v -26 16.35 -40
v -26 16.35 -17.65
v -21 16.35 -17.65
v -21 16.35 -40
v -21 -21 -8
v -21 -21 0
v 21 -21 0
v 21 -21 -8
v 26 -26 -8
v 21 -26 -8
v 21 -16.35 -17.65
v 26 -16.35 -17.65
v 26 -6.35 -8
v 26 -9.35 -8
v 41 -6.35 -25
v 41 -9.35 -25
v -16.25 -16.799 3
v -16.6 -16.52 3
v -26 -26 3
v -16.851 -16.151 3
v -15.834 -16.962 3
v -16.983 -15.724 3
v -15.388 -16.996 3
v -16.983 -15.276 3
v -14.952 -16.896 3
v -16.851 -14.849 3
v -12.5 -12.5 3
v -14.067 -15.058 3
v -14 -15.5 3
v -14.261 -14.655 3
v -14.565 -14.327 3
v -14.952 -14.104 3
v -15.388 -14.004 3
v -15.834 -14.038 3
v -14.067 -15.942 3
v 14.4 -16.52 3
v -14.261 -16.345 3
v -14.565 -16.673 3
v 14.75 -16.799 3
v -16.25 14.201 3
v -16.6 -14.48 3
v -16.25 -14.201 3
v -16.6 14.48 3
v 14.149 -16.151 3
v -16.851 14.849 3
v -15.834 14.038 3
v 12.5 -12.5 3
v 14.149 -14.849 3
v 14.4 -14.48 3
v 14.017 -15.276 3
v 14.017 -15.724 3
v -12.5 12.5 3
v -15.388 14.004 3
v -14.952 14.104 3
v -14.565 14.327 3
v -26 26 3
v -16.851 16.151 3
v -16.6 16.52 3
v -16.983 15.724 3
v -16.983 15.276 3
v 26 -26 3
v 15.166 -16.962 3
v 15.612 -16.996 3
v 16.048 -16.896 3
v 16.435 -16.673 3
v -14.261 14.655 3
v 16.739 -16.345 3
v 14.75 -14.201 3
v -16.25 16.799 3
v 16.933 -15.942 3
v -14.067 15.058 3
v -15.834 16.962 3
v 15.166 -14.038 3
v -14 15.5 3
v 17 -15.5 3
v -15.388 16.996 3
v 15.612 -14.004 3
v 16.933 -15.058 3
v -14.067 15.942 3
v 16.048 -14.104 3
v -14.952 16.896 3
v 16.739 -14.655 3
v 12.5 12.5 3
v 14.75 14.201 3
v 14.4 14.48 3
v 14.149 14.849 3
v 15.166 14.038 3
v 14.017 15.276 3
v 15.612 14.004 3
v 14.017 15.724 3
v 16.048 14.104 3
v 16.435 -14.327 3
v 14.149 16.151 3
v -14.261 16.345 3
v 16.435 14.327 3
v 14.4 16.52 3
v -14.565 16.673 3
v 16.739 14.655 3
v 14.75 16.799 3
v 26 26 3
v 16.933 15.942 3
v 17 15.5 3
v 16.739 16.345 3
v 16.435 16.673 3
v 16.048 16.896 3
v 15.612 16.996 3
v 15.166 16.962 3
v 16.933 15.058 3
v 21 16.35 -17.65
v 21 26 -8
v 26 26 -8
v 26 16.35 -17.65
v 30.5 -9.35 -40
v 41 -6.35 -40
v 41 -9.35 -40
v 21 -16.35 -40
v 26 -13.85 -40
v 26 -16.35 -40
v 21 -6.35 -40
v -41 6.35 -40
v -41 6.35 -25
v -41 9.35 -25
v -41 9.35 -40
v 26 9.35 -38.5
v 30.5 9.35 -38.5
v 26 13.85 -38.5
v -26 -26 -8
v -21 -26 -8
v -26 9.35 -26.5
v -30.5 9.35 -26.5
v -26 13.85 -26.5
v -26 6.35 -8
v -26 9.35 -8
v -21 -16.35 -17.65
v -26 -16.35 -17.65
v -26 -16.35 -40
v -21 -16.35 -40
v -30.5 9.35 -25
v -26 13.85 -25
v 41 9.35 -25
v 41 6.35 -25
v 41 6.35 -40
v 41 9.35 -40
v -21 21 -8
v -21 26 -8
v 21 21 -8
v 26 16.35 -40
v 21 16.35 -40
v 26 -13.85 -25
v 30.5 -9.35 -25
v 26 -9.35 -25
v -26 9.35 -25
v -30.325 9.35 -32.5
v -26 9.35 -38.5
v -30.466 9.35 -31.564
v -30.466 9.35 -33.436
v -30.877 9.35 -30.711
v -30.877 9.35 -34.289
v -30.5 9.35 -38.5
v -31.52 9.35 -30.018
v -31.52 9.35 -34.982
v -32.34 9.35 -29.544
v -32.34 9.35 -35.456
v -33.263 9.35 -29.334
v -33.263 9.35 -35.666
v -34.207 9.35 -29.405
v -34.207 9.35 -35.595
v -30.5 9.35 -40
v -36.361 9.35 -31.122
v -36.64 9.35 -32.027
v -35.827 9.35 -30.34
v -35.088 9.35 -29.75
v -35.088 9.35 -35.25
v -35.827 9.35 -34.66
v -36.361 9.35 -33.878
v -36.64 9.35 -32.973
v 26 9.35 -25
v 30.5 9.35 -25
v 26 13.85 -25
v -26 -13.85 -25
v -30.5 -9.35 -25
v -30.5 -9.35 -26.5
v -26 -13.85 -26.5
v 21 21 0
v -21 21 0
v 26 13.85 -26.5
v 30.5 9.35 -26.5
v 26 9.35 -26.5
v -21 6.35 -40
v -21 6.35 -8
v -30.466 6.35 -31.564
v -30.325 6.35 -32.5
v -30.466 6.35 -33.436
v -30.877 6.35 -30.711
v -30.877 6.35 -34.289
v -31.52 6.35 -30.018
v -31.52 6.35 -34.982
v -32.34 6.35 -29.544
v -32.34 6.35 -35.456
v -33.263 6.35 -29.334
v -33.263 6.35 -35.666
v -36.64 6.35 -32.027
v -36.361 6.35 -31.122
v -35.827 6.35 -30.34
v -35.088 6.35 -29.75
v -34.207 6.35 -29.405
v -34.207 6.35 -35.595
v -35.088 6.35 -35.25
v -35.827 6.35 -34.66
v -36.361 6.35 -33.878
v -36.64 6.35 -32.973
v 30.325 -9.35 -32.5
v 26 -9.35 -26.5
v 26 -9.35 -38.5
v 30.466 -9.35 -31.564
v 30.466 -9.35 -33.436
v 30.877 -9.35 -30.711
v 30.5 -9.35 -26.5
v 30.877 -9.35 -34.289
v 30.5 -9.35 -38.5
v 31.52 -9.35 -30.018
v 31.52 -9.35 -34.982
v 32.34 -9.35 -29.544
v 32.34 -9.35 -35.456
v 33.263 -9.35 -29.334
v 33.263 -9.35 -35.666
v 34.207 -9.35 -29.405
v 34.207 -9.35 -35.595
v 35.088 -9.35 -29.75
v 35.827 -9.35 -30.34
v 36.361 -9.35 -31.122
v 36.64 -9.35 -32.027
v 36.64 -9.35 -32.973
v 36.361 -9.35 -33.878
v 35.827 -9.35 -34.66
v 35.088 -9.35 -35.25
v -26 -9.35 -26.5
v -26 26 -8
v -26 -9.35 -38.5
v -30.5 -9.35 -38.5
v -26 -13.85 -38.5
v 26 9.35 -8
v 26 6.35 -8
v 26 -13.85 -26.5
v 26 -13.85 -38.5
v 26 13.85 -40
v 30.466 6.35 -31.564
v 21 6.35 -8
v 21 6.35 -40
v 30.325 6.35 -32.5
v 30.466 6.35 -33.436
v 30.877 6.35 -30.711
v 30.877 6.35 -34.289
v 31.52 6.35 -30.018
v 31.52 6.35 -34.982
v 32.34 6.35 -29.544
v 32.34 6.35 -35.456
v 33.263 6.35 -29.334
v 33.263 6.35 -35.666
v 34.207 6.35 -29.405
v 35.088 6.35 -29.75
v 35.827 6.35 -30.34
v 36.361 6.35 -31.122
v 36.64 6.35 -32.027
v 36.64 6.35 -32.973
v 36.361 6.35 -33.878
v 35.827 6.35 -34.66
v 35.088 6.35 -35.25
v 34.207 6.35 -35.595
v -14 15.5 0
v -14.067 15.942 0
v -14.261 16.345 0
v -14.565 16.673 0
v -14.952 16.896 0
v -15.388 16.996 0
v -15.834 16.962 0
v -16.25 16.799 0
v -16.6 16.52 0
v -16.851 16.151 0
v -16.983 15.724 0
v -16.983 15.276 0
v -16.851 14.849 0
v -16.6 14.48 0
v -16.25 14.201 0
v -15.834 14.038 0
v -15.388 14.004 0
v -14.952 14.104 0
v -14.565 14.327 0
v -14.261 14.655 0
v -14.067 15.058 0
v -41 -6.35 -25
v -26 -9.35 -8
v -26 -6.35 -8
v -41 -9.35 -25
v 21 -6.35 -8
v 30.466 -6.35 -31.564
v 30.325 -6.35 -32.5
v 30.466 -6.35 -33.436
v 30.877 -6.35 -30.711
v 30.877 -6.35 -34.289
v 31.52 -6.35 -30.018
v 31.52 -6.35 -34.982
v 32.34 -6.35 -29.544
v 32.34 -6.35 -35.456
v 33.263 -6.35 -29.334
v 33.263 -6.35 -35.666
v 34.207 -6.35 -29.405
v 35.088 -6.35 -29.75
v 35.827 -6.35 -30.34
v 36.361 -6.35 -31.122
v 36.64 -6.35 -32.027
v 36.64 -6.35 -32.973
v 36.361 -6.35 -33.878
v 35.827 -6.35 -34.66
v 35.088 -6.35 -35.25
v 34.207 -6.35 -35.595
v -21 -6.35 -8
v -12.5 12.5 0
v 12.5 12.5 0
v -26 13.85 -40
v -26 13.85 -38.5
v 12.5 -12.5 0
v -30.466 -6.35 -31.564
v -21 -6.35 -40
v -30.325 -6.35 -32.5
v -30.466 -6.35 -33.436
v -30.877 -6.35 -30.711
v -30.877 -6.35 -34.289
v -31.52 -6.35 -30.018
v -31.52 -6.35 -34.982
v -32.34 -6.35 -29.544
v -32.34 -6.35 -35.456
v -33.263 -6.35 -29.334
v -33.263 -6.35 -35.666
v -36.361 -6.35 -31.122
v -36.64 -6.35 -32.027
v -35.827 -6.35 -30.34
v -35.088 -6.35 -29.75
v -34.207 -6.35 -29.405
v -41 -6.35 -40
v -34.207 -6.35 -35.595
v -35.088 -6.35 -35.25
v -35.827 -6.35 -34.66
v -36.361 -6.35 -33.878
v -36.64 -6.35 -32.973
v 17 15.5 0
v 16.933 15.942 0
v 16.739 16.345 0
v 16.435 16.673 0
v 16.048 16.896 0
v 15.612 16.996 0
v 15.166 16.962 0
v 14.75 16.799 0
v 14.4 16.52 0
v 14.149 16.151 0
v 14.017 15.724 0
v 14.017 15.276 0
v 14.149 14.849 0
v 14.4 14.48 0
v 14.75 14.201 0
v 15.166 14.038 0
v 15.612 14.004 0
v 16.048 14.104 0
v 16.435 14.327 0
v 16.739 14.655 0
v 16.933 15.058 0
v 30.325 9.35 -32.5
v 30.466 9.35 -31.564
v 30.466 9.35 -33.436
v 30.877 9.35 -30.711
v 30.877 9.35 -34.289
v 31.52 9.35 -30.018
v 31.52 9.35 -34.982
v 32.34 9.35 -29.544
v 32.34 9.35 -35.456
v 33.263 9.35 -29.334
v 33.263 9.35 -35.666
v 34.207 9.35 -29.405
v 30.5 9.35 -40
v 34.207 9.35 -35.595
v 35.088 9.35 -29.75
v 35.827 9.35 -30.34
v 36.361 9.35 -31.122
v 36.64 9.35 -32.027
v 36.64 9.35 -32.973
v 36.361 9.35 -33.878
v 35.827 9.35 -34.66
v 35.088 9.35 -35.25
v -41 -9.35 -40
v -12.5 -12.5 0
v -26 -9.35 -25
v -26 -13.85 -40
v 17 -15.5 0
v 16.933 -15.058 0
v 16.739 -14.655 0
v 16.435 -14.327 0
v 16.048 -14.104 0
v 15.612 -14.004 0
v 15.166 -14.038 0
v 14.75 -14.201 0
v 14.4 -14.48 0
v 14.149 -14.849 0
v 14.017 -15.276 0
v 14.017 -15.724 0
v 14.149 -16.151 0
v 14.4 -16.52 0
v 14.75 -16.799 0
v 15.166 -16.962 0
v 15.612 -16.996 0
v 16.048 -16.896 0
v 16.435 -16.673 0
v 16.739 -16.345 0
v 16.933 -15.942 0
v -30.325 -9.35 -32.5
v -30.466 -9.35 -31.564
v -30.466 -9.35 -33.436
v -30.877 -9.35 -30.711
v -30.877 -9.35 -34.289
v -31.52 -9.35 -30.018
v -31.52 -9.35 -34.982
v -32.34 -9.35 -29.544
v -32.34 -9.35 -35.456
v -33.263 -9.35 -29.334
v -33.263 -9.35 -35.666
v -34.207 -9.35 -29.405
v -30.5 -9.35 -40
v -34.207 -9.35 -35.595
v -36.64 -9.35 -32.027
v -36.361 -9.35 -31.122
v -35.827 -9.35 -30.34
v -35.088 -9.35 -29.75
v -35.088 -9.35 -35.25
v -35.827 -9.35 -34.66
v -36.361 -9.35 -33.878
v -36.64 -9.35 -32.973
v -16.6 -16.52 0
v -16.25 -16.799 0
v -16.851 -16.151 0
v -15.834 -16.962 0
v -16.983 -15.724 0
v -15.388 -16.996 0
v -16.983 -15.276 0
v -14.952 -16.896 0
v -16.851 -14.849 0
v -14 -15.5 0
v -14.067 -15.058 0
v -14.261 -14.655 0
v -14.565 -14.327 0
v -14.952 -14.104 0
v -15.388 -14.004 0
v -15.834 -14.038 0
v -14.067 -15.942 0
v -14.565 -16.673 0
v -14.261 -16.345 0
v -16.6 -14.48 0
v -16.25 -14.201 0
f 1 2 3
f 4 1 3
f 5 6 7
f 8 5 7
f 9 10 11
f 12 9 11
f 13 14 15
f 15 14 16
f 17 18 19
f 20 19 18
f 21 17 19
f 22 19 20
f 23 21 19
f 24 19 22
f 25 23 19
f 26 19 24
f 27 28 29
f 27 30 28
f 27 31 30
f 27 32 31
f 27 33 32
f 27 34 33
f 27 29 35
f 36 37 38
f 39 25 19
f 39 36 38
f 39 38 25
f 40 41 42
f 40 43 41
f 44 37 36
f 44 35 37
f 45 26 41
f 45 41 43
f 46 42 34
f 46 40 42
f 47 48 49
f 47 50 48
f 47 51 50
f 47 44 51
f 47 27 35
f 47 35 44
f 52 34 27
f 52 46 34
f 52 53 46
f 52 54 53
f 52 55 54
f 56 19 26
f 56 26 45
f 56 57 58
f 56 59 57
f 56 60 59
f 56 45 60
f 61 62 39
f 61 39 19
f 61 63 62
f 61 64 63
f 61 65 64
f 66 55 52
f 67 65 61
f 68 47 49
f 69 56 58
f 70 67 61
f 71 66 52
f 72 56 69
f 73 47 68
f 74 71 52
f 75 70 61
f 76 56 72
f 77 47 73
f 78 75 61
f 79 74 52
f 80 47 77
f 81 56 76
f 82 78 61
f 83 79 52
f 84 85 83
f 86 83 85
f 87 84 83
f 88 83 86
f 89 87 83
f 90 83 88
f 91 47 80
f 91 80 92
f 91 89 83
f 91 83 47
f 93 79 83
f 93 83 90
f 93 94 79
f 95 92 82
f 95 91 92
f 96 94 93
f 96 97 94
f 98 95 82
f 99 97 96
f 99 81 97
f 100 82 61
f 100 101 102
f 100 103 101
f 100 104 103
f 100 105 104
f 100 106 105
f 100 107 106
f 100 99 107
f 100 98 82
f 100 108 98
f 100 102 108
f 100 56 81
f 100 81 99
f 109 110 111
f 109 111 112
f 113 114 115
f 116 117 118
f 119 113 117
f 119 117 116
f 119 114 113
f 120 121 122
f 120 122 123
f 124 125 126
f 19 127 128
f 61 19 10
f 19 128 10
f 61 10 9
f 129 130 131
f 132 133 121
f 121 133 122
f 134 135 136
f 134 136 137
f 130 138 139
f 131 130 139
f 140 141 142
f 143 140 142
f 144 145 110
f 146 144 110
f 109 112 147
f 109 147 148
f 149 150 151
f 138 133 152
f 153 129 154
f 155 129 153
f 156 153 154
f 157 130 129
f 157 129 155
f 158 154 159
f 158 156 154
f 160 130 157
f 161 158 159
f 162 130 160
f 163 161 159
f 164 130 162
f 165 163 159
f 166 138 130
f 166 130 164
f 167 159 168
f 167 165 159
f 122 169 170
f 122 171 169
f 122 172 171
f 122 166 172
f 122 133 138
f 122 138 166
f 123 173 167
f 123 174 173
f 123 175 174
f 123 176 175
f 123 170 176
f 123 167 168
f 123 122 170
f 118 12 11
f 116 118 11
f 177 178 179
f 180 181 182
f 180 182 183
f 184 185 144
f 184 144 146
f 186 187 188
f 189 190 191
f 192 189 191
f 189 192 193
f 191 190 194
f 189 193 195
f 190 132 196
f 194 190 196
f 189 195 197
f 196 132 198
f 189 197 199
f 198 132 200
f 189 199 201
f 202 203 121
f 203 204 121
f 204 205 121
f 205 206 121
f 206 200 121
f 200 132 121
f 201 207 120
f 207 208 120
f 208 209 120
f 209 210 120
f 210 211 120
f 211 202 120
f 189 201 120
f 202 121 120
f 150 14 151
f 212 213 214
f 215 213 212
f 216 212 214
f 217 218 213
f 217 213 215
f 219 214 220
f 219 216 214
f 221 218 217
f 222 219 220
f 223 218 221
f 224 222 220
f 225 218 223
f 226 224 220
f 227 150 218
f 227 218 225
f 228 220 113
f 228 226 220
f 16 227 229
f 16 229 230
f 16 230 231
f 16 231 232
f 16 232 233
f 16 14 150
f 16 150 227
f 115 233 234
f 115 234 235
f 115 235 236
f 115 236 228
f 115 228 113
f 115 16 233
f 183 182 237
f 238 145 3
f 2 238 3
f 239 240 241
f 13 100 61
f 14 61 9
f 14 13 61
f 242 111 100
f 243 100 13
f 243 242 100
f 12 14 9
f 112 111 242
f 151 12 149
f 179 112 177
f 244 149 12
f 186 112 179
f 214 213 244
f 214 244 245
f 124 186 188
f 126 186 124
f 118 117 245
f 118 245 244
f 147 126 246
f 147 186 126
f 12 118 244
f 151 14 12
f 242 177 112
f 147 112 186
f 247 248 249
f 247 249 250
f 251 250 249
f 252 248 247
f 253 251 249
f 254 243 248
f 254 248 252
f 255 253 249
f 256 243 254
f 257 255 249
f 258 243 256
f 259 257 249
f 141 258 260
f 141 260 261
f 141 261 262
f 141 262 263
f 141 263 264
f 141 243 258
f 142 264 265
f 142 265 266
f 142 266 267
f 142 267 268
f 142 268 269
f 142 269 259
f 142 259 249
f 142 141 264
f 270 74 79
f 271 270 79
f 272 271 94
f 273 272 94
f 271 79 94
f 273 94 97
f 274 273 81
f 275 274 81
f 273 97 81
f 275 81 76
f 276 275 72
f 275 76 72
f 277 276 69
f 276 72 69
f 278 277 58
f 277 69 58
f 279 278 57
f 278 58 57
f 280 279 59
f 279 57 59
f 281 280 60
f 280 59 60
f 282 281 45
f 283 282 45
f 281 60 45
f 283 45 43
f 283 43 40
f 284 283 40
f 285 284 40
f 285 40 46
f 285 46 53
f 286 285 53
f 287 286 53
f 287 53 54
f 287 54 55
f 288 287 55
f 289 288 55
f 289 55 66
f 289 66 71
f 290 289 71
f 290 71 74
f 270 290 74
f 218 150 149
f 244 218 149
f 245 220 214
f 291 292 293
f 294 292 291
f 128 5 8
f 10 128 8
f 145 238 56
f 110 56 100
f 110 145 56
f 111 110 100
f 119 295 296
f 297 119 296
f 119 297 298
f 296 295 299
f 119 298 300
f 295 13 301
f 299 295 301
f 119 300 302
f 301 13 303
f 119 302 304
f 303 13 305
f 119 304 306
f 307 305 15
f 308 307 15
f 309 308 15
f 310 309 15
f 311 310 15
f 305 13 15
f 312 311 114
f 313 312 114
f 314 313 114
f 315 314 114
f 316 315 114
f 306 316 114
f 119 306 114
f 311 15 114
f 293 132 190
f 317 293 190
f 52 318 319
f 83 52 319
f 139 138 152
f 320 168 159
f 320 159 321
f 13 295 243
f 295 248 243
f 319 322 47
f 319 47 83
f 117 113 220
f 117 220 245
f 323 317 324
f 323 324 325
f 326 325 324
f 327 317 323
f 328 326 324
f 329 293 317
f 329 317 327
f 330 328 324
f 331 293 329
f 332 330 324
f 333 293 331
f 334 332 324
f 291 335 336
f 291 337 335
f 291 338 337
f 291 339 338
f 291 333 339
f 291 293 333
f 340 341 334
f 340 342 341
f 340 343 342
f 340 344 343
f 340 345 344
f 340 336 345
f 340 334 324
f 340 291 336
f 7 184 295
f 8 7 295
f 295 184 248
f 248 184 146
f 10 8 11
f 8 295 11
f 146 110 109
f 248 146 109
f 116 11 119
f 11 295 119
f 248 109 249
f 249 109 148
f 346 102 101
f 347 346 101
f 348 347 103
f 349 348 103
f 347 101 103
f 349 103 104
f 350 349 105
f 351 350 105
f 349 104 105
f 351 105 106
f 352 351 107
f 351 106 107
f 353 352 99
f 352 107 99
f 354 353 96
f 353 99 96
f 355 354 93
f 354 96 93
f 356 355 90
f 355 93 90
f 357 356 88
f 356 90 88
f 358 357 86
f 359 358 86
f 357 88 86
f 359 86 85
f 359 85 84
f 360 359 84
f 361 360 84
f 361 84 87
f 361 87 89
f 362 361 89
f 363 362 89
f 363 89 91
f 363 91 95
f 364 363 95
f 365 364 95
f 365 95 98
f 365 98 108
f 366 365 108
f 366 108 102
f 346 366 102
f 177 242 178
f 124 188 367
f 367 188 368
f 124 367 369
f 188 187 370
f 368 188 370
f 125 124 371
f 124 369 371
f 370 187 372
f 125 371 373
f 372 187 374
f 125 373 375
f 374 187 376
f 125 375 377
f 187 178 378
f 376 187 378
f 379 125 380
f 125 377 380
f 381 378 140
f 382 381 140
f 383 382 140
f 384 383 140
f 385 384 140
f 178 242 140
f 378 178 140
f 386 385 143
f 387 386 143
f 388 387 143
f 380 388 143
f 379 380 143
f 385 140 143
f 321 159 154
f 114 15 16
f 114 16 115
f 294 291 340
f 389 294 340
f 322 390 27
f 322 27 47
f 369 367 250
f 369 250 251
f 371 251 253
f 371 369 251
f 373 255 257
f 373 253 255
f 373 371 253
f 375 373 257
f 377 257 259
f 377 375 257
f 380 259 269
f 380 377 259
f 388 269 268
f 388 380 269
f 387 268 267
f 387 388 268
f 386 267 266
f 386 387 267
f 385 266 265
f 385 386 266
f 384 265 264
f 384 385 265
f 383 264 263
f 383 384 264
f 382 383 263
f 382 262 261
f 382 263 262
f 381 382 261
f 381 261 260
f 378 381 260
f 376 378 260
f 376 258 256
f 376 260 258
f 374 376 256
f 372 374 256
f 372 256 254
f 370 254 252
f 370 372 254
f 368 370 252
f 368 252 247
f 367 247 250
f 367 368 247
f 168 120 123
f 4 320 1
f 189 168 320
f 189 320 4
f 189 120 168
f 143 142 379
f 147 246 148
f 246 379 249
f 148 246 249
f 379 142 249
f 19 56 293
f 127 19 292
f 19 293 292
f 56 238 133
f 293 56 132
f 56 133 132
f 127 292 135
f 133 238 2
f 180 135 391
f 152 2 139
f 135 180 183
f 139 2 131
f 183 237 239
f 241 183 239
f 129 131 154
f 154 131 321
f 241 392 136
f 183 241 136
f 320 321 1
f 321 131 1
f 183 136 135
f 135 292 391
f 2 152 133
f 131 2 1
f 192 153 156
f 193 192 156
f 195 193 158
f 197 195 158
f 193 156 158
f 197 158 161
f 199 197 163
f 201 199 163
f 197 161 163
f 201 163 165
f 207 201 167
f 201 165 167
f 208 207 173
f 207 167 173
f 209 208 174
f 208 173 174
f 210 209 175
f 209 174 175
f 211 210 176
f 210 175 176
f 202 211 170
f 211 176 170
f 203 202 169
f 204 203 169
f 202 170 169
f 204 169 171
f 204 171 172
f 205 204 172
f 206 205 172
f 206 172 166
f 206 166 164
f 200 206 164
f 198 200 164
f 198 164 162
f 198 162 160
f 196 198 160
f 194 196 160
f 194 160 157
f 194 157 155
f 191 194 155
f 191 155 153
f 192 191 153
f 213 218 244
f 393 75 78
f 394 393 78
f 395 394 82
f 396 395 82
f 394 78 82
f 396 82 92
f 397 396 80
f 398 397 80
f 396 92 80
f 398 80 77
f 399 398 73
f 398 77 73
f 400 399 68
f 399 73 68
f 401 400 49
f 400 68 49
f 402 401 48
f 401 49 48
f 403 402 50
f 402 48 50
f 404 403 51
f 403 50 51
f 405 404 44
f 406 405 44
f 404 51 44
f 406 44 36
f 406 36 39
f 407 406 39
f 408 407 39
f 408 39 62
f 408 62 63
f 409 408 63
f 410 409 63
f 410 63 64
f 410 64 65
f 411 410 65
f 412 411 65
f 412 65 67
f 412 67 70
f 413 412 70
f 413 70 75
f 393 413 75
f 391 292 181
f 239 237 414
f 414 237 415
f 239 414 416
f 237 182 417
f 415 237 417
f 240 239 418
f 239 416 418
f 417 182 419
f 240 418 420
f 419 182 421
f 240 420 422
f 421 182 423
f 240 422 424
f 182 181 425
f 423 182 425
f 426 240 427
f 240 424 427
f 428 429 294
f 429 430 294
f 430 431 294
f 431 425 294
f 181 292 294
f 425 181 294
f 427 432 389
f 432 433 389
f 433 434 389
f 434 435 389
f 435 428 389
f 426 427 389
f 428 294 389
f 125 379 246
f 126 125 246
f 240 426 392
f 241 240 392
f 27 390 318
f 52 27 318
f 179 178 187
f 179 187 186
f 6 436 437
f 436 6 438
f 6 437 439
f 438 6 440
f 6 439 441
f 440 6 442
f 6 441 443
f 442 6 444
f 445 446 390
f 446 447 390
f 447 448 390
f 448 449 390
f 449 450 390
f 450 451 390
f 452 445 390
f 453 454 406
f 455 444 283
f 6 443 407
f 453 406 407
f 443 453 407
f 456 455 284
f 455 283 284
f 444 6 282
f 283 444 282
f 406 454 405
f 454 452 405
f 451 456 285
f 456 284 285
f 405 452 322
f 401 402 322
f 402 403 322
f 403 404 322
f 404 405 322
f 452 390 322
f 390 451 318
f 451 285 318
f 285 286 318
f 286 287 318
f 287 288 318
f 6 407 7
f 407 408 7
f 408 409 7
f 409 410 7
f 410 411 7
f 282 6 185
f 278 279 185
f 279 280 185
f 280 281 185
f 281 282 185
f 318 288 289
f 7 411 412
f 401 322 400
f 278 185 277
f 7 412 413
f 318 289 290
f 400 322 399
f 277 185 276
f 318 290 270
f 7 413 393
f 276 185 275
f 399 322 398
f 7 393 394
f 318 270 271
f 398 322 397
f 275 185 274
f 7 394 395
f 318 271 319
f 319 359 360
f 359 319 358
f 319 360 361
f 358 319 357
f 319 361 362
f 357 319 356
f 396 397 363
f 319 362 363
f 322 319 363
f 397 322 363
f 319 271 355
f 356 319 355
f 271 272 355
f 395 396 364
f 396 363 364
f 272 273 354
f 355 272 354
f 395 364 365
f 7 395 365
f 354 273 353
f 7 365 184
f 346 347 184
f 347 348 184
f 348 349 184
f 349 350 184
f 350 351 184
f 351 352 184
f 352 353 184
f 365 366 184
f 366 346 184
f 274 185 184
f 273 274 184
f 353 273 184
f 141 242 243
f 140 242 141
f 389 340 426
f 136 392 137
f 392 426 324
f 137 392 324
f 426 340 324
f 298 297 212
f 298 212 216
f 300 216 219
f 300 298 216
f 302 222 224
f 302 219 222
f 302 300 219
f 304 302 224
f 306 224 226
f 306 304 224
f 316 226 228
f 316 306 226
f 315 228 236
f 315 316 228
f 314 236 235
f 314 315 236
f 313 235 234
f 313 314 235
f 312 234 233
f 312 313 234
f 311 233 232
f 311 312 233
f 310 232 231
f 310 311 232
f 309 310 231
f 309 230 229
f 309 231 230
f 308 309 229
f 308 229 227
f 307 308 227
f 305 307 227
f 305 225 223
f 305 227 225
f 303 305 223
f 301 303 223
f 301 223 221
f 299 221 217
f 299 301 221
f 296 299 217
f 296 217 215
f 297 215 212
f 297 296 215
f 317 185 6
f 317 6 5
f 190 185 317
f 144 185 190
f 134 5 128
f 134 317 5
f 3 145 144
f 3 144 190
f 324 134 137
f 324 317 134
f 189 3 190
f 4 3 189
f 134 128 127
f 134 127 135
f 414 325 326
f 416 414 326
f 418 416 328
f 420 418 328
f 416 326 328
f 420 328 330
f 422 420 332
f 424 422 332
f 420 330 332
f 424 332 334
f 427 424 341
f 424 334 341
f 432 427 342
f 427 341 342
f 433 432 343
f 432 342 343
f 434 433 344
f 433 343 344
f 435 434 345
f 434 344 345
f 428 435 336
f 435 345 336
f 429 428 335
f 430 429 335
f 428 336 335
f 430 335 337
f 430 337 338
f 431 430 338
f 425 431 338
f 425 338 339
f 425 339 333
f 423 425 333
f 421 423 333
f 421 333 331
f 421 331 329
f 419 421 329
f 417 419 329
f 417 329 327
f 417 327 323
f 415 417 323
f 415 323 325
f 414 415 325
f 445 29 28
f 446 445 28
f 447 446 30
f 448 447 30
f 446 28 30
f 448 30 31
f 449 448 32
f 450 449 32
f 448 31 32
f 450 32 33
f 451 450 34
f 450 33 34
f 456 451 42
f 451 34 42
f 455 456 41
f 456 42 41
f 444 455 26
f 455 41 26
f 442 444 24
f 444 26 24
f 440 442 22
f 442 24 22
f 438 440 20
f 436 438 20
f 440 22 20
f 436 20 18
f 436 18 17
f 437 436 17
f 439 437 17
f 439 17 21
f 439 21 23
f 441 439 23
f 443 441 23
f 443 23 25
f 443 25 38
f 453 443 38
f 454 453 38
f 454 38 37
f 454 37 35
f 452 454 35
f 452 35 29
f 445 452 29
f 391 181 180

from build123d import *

# Parameters (mm, degrees)
SKETCH1_W                   = 52
SKETCH1_H                   = 52
SKETCH1_W_2                 = 42
SKETCH1_H_2                 = 42
BOSS_EXTRUDE1_DEPTH         = 8
SKETCH3_W                   = 5
SKETCH3_H                   = 10
BOSS_EXTRUDE3_DEPTH         = 32
SKETCH4_W                   = 15
SKETCH4_H                   = 3
BOSS_EXTRUDE4_DEPTH         = 15
MIRROR2_COPY_1_SKETCH_W     = 15
MIRROR2_COPY_1_SKETCH_H     = 3
MIRROR2_COPY_1_DEPTH        = 15
SKETCH2_W                   = 52
SKETCH2_H                   = 52
SKETCH2_W_2                 = 25
SKETCH2_H_2                 = 25
BOSS_EXTRUDE2_DEPTH         = 3
F_1_4_0_25_DIAMETER_HOLE1_D = 6.35
RIB1_REACH                  = 84.25
SKETCH9_WALL_W              = 180.146400996
SKETCH9_WALL_H              = 5
MIRROR5_COPY_1_REACH        = 84.25
MIRROR5_COPY_1_SKETCH_W     = 180.146400996
MIRROR5_COPY_1_SKETCH_H     = 5
F_3_0MM_DOWEL_HOLE1_D       = 3
BOSS_EXTRUDE5_DEPTH         = 1.5
BOSS_EXTRUDE6_START         = -15
BOSS_EXTRUDE6_DEPTH         = 1.5
MIRROR7_COPY_1_DEPTH        = 1.5
MIRROR7_START               = -15
MIRROR7_COPY_2_DEPTH        = 1.5
RIB12_REACH                 = 67.784
SKETCH13_WALL_W             = 156.23938331
SKETCH13_WALL_H             = 3
MIRROR9_COPY_1_REACH        = 67.784
MIRROR9_COPY_1_SKETCH_W     = 156.23938331
MIRROR9_COPY_1_SKETCH_H     = 3


with BuildPart() as part:
    # Sketch1 → Boss-Extrude1 (new body)
    with BuildSketch(Plane.XY):
        Rectangle(SKETCH1_W, SKETCH1_H)
        Rectangle(SKETCH1_W_2, SKETCH1_H_2, mode=Mode.SUBTRACT)
    extrude(amount=-BOSS_EXTRUDE1_DEPTH)

    # Sketch3 → Boss-Extrude3 (add)
    with BuildSketch(Plane(origin=(0, 0, -8), x_dir=(-1, 0, 0), z_dir=(0, 0, -1))):
        with Locations((-23.5, 11.35)):
            Rectangle(SKETCH3_W, SKETCH3_H)
        with Locations((-23.5, -11.35)):
            Rectangle(SKETCH3_W, SKETCH3_H)
    boss_extrude3 = extrude(amount=BOSS_EXTRUDE3_DEPTH)

    # Sketch4 → Boss-Extrude4 (add)
    with BuildSketch(Plane(origin=(26, 0, 0), x_dir=(0, 0, -1), z_dir=(1, 0, 0))):
        with Locations((32.5, -7.85)):
            Rectangle(SKETCH4_W, SKETCH4_H)
    boss_extrude4 = extrude(amount=BOSS_EXTRUDE4_DEPTH)

    # Mirror1: Boss-Extrude4 across plane
    add(boss_extrude4.mirror(Plane.ZX))

    # Mirror2: Boss-Extrude3, Boss-Extrude4 across plane
    add(boss_extrude3.mirror(Plane(origin=(0, 0, 0), x_dir=(0, 0, 1), z_dir=(1, 0, 0))))
    add(boss_extrude4.mirror(Plane(origin=(0, 0, 0), x_dir=(0, 0, 1), z_dir=(1, 0, 0))))

    # Mirror2 copy 1 sketch → Mirror2 copy 1 (add)
    with BuildSketch(Plane(origin=(-26, 0, 0), x_dir=(0, 0, -1), z_dir=(-1, 0, 0))):
        with Locations((32.5, -7.85)):
            Rectangle(MIRROR2_COPY_1_SKETCH_W, MIRROR2_COPY_1_SKETCH_H)
    extrude(amount=MIRROR2_COPY_1_DEPTH)

    # Sketch2 → Boss-Extrude2 (add)
    with BuildSketch(Plane.XY):
        Rectangle(SKETCH2_W, SKETCH2_H)
        Rectangle(SKETCH2_W_2, SKETCH2_H_2, mode=Mode.SUBTRACT)
    extrude(amount=BOSS_EXTRUDE2_DEPTH)

    # 1/4 (0.25) Diameter Hole1 (through all)
    with Locations(Plane(origin=(0, -9.35, 0), x_dir=(-1, 0, 0), z_dir=(0, -1, 0))):
        with Locations((33.5, 32.5)):
            f_1_4_0_25_diameter_hole1 = Hole(F_1_4_0_25_DIAMETER_HOLE1_D / 2)

    # Mirror3: 1/4 (0.25) Diameter Hole1 across plane
    add(f_1_4_0_25_diameter_hole1.mirror(Plane(origin=(0, 0, 0), x_dir=(0, 0, 1), z_dir=(1, 0, 0))), mode=Mode.SUBTRACT)

    # Sketch9 wall → Rib1 (add, up to next)
    with BuildSketch(Plane(origin=(-26, -21.175, -12.825), x_dir=(0, 0.707106781187, -0.707106781187), z_dir=(0, -0.707106781187, -0.707106781187)), mode=Mode.PRIVATE) as rib1_sk1:
        with Locations((0, 2.5)):
            Rectangle(SKETCH9_WALL_W, SKETCH9_WALL_H)
    rib1_tool1 = extrude(rib1_sk1.sketch, amount=-RIB1_REACH, mode=Mode.PRIVATE) - part.part
    rib1 = rib1_tool1.solids().sort_by_distance((-26, -21.175, -12.825))[0]
    add(rib1)

    # Mirror4: Rib1 across plane
    add(rib1.mirror(Plane.ZX))

    # Mirror5: Rib1 across plane
    add(rib1.mirror(Plane(origin=(0, 0, 0), x_dir=(0, 0, 1), z_dir=(1, 0, 0))))

    # Mirror5 copy 1 sketch → Mirror5 copy 1 (add, up to next)
    with BuildSketch(Plane(origin=(26, 21.175, -12.825), x_dir=(0, -0.707106781187, -0.707106781187), z_dir=(0, 0.707106781187, -0.707106781187)), mode=Mode.PRIVATE) as mirror5_copy_1_sk1:
        with Locations((0, 2.5)):
            Rectangle(MIRROR5_COPY_1_SKETCH_W, MIRROR5_COPY_1_SKETCH_H)
    mirror5_copy_1_tool1 = extrude(mirror5_copy_1_sk1.sketch, amount=-MIRROR5_COPY_1_REACH, mode=Mode.PRIVATE) - part.part
    add(mirror5_copy_1_tool1.solids().sort_by_distance((26, 21.175, -12.825))[0])

    # Ø3.0mm Dowel Hole1 (through all)
    with Locations(Plane(origin=(0, 0, 0), x_dir=(-1, 0, 0), z_dir=(0, 0, -1))):
        with Locations((15.5, -15.5), (-15.5, -15.5), (-15.5, 15.5), (15.5, 15.5)):
            Hole(F_3_0MM_DOWEL_HOLE1_D / 2)

    # Sketch12 → Boss-Extrude5 (add)
    with BuildSketch(Plane.XY.offset(-25)):
        Polygon((-30.5, -9.35), (-26, -13.85), (-26, -9.35), align=None)
    boss_extrude5 = extrude(amount=-BOSS_EXTRUDE5_DEPTH)

    # Sketch12<3> → Boss-Extrude6 (add)
    with BuildSketch(Plane.XY.offset(-25).offset(BOSS_EXTRUDE6_START)):
        Polygon((-30.5, -9.35), (-26, -13.85), (-26, -9.35), align=None)
    boss_extrude6 = extrude(amount=BOSS_EXTRUDE6_DEPTH)

    # Mirror6: Boss-Extrude5, Boss-Extrude6 across plane
    add(boss_extrude5.mirror(Plane(origin=(0, 0, 0), x_dir=(0, 0, 1), z_dir=(1, 0, 0))))
    add(boss_extrude6.mirror(Plane(origin=(0, 0, 0), x_dir=(0, 0, 1), z_dir=(1, 0, 0))))

    # Mirror7: Boss-Extrude5, Boss-Extrude6 across plane
    add(boss_extrude5.mirror(Plane.ZX))
    add(boss_extrude6.mirror(Plane.ZX))

    # Mirror7 copy 1 sketch → Mirror7 copy 1 (add)
    with BuildSketch(Plane(origin=(0, 0, -25), x_dir=(-1, 0, 0), z_dir=(0, 0, 1))):
        Polygon((-30.5, -9.35), (-26, -13.85), (-26, -9.35), align=None)
    extrude(amount=-MIRROR7_COPY_1_DEPTH)

    # Mirror7 copy 2 sketch → Mirror7 copy 2 (add)
    with BuildSketch(Plane(origin=(0, 0, -25), x_dir=(-1, 0, 0), z_dir=(0, 0, 1)).offset(MIRROR7_START)):
        Polygon((-30.5, -9.35), (-26, -13.85), (-26, -9.35), align=None)
    extrude(amount=MIRROR7_COPY_2_DEPTH)

    # Sketch13 wall → Rib12 (add, up to next)
    with BuildSketch(Plane(origin=(-33.5, -6.35, -16.5), x_dir=(-0.661621637087, 0, -0.749837855365), z_dir=(-0.749837855365, 0, 0.661621637087)), mode=Mode.PRIVATE) as rib12_sk1:
        with Locations((0, 1.5)):
            Rectangle(SKETCH13_WALL_W, SKETCH13_WALL_H)
    rib12_tool1 = extrude(rib12_sk1.sketch, amount=-RIB12_REACH, mode=Mode.PRIVATE) - part.part
    rib12 = rib12_tool1.solids().sort_by_distance((-33.5, -6.35, -16.5))[0]
    add(rib12)

    # Mirror8: Rib12 across plane
    add(rib12.mirror(Plane.ZX))

    # Mirror9: Rib12 across plane
    add(rib12.mirror(Plane(origin=(0, 0, 0), x_dir=(0, 0, 1), z_dir=(1, 0, 0))))

    # Mirror9 copy 1 sketch → Mirror9 copy 1 (add, up to next)
    with BuildSketch(Plane(origin=(33.5, 6.35, -16.5), x_dir=(0.661621637087, 0, -0.749837855365), z_dir=(0.749837855365, 0, 0.661621637087)), mode=Mode.PRIVATE) as mirror9_copy_1_sk1:
        with Locations((0, 1.5)):
            Rectangle(MIRROR9_COPY_1_SKETCH_W, MIRROR9_COPY_1_SKETCH_H)
    mirror9_copy_1_tool1 = extrude(mirror9_copy_1_sk1.sketch, amount=-MIRROR9_COPY_1_REACH, mode=Mode.PRIVATE) - part.part
    add(mirror9_copy_1_tool1.solids().sort_by_distance((33.5, 6.35, -16.5))[0])


solid = part.part
